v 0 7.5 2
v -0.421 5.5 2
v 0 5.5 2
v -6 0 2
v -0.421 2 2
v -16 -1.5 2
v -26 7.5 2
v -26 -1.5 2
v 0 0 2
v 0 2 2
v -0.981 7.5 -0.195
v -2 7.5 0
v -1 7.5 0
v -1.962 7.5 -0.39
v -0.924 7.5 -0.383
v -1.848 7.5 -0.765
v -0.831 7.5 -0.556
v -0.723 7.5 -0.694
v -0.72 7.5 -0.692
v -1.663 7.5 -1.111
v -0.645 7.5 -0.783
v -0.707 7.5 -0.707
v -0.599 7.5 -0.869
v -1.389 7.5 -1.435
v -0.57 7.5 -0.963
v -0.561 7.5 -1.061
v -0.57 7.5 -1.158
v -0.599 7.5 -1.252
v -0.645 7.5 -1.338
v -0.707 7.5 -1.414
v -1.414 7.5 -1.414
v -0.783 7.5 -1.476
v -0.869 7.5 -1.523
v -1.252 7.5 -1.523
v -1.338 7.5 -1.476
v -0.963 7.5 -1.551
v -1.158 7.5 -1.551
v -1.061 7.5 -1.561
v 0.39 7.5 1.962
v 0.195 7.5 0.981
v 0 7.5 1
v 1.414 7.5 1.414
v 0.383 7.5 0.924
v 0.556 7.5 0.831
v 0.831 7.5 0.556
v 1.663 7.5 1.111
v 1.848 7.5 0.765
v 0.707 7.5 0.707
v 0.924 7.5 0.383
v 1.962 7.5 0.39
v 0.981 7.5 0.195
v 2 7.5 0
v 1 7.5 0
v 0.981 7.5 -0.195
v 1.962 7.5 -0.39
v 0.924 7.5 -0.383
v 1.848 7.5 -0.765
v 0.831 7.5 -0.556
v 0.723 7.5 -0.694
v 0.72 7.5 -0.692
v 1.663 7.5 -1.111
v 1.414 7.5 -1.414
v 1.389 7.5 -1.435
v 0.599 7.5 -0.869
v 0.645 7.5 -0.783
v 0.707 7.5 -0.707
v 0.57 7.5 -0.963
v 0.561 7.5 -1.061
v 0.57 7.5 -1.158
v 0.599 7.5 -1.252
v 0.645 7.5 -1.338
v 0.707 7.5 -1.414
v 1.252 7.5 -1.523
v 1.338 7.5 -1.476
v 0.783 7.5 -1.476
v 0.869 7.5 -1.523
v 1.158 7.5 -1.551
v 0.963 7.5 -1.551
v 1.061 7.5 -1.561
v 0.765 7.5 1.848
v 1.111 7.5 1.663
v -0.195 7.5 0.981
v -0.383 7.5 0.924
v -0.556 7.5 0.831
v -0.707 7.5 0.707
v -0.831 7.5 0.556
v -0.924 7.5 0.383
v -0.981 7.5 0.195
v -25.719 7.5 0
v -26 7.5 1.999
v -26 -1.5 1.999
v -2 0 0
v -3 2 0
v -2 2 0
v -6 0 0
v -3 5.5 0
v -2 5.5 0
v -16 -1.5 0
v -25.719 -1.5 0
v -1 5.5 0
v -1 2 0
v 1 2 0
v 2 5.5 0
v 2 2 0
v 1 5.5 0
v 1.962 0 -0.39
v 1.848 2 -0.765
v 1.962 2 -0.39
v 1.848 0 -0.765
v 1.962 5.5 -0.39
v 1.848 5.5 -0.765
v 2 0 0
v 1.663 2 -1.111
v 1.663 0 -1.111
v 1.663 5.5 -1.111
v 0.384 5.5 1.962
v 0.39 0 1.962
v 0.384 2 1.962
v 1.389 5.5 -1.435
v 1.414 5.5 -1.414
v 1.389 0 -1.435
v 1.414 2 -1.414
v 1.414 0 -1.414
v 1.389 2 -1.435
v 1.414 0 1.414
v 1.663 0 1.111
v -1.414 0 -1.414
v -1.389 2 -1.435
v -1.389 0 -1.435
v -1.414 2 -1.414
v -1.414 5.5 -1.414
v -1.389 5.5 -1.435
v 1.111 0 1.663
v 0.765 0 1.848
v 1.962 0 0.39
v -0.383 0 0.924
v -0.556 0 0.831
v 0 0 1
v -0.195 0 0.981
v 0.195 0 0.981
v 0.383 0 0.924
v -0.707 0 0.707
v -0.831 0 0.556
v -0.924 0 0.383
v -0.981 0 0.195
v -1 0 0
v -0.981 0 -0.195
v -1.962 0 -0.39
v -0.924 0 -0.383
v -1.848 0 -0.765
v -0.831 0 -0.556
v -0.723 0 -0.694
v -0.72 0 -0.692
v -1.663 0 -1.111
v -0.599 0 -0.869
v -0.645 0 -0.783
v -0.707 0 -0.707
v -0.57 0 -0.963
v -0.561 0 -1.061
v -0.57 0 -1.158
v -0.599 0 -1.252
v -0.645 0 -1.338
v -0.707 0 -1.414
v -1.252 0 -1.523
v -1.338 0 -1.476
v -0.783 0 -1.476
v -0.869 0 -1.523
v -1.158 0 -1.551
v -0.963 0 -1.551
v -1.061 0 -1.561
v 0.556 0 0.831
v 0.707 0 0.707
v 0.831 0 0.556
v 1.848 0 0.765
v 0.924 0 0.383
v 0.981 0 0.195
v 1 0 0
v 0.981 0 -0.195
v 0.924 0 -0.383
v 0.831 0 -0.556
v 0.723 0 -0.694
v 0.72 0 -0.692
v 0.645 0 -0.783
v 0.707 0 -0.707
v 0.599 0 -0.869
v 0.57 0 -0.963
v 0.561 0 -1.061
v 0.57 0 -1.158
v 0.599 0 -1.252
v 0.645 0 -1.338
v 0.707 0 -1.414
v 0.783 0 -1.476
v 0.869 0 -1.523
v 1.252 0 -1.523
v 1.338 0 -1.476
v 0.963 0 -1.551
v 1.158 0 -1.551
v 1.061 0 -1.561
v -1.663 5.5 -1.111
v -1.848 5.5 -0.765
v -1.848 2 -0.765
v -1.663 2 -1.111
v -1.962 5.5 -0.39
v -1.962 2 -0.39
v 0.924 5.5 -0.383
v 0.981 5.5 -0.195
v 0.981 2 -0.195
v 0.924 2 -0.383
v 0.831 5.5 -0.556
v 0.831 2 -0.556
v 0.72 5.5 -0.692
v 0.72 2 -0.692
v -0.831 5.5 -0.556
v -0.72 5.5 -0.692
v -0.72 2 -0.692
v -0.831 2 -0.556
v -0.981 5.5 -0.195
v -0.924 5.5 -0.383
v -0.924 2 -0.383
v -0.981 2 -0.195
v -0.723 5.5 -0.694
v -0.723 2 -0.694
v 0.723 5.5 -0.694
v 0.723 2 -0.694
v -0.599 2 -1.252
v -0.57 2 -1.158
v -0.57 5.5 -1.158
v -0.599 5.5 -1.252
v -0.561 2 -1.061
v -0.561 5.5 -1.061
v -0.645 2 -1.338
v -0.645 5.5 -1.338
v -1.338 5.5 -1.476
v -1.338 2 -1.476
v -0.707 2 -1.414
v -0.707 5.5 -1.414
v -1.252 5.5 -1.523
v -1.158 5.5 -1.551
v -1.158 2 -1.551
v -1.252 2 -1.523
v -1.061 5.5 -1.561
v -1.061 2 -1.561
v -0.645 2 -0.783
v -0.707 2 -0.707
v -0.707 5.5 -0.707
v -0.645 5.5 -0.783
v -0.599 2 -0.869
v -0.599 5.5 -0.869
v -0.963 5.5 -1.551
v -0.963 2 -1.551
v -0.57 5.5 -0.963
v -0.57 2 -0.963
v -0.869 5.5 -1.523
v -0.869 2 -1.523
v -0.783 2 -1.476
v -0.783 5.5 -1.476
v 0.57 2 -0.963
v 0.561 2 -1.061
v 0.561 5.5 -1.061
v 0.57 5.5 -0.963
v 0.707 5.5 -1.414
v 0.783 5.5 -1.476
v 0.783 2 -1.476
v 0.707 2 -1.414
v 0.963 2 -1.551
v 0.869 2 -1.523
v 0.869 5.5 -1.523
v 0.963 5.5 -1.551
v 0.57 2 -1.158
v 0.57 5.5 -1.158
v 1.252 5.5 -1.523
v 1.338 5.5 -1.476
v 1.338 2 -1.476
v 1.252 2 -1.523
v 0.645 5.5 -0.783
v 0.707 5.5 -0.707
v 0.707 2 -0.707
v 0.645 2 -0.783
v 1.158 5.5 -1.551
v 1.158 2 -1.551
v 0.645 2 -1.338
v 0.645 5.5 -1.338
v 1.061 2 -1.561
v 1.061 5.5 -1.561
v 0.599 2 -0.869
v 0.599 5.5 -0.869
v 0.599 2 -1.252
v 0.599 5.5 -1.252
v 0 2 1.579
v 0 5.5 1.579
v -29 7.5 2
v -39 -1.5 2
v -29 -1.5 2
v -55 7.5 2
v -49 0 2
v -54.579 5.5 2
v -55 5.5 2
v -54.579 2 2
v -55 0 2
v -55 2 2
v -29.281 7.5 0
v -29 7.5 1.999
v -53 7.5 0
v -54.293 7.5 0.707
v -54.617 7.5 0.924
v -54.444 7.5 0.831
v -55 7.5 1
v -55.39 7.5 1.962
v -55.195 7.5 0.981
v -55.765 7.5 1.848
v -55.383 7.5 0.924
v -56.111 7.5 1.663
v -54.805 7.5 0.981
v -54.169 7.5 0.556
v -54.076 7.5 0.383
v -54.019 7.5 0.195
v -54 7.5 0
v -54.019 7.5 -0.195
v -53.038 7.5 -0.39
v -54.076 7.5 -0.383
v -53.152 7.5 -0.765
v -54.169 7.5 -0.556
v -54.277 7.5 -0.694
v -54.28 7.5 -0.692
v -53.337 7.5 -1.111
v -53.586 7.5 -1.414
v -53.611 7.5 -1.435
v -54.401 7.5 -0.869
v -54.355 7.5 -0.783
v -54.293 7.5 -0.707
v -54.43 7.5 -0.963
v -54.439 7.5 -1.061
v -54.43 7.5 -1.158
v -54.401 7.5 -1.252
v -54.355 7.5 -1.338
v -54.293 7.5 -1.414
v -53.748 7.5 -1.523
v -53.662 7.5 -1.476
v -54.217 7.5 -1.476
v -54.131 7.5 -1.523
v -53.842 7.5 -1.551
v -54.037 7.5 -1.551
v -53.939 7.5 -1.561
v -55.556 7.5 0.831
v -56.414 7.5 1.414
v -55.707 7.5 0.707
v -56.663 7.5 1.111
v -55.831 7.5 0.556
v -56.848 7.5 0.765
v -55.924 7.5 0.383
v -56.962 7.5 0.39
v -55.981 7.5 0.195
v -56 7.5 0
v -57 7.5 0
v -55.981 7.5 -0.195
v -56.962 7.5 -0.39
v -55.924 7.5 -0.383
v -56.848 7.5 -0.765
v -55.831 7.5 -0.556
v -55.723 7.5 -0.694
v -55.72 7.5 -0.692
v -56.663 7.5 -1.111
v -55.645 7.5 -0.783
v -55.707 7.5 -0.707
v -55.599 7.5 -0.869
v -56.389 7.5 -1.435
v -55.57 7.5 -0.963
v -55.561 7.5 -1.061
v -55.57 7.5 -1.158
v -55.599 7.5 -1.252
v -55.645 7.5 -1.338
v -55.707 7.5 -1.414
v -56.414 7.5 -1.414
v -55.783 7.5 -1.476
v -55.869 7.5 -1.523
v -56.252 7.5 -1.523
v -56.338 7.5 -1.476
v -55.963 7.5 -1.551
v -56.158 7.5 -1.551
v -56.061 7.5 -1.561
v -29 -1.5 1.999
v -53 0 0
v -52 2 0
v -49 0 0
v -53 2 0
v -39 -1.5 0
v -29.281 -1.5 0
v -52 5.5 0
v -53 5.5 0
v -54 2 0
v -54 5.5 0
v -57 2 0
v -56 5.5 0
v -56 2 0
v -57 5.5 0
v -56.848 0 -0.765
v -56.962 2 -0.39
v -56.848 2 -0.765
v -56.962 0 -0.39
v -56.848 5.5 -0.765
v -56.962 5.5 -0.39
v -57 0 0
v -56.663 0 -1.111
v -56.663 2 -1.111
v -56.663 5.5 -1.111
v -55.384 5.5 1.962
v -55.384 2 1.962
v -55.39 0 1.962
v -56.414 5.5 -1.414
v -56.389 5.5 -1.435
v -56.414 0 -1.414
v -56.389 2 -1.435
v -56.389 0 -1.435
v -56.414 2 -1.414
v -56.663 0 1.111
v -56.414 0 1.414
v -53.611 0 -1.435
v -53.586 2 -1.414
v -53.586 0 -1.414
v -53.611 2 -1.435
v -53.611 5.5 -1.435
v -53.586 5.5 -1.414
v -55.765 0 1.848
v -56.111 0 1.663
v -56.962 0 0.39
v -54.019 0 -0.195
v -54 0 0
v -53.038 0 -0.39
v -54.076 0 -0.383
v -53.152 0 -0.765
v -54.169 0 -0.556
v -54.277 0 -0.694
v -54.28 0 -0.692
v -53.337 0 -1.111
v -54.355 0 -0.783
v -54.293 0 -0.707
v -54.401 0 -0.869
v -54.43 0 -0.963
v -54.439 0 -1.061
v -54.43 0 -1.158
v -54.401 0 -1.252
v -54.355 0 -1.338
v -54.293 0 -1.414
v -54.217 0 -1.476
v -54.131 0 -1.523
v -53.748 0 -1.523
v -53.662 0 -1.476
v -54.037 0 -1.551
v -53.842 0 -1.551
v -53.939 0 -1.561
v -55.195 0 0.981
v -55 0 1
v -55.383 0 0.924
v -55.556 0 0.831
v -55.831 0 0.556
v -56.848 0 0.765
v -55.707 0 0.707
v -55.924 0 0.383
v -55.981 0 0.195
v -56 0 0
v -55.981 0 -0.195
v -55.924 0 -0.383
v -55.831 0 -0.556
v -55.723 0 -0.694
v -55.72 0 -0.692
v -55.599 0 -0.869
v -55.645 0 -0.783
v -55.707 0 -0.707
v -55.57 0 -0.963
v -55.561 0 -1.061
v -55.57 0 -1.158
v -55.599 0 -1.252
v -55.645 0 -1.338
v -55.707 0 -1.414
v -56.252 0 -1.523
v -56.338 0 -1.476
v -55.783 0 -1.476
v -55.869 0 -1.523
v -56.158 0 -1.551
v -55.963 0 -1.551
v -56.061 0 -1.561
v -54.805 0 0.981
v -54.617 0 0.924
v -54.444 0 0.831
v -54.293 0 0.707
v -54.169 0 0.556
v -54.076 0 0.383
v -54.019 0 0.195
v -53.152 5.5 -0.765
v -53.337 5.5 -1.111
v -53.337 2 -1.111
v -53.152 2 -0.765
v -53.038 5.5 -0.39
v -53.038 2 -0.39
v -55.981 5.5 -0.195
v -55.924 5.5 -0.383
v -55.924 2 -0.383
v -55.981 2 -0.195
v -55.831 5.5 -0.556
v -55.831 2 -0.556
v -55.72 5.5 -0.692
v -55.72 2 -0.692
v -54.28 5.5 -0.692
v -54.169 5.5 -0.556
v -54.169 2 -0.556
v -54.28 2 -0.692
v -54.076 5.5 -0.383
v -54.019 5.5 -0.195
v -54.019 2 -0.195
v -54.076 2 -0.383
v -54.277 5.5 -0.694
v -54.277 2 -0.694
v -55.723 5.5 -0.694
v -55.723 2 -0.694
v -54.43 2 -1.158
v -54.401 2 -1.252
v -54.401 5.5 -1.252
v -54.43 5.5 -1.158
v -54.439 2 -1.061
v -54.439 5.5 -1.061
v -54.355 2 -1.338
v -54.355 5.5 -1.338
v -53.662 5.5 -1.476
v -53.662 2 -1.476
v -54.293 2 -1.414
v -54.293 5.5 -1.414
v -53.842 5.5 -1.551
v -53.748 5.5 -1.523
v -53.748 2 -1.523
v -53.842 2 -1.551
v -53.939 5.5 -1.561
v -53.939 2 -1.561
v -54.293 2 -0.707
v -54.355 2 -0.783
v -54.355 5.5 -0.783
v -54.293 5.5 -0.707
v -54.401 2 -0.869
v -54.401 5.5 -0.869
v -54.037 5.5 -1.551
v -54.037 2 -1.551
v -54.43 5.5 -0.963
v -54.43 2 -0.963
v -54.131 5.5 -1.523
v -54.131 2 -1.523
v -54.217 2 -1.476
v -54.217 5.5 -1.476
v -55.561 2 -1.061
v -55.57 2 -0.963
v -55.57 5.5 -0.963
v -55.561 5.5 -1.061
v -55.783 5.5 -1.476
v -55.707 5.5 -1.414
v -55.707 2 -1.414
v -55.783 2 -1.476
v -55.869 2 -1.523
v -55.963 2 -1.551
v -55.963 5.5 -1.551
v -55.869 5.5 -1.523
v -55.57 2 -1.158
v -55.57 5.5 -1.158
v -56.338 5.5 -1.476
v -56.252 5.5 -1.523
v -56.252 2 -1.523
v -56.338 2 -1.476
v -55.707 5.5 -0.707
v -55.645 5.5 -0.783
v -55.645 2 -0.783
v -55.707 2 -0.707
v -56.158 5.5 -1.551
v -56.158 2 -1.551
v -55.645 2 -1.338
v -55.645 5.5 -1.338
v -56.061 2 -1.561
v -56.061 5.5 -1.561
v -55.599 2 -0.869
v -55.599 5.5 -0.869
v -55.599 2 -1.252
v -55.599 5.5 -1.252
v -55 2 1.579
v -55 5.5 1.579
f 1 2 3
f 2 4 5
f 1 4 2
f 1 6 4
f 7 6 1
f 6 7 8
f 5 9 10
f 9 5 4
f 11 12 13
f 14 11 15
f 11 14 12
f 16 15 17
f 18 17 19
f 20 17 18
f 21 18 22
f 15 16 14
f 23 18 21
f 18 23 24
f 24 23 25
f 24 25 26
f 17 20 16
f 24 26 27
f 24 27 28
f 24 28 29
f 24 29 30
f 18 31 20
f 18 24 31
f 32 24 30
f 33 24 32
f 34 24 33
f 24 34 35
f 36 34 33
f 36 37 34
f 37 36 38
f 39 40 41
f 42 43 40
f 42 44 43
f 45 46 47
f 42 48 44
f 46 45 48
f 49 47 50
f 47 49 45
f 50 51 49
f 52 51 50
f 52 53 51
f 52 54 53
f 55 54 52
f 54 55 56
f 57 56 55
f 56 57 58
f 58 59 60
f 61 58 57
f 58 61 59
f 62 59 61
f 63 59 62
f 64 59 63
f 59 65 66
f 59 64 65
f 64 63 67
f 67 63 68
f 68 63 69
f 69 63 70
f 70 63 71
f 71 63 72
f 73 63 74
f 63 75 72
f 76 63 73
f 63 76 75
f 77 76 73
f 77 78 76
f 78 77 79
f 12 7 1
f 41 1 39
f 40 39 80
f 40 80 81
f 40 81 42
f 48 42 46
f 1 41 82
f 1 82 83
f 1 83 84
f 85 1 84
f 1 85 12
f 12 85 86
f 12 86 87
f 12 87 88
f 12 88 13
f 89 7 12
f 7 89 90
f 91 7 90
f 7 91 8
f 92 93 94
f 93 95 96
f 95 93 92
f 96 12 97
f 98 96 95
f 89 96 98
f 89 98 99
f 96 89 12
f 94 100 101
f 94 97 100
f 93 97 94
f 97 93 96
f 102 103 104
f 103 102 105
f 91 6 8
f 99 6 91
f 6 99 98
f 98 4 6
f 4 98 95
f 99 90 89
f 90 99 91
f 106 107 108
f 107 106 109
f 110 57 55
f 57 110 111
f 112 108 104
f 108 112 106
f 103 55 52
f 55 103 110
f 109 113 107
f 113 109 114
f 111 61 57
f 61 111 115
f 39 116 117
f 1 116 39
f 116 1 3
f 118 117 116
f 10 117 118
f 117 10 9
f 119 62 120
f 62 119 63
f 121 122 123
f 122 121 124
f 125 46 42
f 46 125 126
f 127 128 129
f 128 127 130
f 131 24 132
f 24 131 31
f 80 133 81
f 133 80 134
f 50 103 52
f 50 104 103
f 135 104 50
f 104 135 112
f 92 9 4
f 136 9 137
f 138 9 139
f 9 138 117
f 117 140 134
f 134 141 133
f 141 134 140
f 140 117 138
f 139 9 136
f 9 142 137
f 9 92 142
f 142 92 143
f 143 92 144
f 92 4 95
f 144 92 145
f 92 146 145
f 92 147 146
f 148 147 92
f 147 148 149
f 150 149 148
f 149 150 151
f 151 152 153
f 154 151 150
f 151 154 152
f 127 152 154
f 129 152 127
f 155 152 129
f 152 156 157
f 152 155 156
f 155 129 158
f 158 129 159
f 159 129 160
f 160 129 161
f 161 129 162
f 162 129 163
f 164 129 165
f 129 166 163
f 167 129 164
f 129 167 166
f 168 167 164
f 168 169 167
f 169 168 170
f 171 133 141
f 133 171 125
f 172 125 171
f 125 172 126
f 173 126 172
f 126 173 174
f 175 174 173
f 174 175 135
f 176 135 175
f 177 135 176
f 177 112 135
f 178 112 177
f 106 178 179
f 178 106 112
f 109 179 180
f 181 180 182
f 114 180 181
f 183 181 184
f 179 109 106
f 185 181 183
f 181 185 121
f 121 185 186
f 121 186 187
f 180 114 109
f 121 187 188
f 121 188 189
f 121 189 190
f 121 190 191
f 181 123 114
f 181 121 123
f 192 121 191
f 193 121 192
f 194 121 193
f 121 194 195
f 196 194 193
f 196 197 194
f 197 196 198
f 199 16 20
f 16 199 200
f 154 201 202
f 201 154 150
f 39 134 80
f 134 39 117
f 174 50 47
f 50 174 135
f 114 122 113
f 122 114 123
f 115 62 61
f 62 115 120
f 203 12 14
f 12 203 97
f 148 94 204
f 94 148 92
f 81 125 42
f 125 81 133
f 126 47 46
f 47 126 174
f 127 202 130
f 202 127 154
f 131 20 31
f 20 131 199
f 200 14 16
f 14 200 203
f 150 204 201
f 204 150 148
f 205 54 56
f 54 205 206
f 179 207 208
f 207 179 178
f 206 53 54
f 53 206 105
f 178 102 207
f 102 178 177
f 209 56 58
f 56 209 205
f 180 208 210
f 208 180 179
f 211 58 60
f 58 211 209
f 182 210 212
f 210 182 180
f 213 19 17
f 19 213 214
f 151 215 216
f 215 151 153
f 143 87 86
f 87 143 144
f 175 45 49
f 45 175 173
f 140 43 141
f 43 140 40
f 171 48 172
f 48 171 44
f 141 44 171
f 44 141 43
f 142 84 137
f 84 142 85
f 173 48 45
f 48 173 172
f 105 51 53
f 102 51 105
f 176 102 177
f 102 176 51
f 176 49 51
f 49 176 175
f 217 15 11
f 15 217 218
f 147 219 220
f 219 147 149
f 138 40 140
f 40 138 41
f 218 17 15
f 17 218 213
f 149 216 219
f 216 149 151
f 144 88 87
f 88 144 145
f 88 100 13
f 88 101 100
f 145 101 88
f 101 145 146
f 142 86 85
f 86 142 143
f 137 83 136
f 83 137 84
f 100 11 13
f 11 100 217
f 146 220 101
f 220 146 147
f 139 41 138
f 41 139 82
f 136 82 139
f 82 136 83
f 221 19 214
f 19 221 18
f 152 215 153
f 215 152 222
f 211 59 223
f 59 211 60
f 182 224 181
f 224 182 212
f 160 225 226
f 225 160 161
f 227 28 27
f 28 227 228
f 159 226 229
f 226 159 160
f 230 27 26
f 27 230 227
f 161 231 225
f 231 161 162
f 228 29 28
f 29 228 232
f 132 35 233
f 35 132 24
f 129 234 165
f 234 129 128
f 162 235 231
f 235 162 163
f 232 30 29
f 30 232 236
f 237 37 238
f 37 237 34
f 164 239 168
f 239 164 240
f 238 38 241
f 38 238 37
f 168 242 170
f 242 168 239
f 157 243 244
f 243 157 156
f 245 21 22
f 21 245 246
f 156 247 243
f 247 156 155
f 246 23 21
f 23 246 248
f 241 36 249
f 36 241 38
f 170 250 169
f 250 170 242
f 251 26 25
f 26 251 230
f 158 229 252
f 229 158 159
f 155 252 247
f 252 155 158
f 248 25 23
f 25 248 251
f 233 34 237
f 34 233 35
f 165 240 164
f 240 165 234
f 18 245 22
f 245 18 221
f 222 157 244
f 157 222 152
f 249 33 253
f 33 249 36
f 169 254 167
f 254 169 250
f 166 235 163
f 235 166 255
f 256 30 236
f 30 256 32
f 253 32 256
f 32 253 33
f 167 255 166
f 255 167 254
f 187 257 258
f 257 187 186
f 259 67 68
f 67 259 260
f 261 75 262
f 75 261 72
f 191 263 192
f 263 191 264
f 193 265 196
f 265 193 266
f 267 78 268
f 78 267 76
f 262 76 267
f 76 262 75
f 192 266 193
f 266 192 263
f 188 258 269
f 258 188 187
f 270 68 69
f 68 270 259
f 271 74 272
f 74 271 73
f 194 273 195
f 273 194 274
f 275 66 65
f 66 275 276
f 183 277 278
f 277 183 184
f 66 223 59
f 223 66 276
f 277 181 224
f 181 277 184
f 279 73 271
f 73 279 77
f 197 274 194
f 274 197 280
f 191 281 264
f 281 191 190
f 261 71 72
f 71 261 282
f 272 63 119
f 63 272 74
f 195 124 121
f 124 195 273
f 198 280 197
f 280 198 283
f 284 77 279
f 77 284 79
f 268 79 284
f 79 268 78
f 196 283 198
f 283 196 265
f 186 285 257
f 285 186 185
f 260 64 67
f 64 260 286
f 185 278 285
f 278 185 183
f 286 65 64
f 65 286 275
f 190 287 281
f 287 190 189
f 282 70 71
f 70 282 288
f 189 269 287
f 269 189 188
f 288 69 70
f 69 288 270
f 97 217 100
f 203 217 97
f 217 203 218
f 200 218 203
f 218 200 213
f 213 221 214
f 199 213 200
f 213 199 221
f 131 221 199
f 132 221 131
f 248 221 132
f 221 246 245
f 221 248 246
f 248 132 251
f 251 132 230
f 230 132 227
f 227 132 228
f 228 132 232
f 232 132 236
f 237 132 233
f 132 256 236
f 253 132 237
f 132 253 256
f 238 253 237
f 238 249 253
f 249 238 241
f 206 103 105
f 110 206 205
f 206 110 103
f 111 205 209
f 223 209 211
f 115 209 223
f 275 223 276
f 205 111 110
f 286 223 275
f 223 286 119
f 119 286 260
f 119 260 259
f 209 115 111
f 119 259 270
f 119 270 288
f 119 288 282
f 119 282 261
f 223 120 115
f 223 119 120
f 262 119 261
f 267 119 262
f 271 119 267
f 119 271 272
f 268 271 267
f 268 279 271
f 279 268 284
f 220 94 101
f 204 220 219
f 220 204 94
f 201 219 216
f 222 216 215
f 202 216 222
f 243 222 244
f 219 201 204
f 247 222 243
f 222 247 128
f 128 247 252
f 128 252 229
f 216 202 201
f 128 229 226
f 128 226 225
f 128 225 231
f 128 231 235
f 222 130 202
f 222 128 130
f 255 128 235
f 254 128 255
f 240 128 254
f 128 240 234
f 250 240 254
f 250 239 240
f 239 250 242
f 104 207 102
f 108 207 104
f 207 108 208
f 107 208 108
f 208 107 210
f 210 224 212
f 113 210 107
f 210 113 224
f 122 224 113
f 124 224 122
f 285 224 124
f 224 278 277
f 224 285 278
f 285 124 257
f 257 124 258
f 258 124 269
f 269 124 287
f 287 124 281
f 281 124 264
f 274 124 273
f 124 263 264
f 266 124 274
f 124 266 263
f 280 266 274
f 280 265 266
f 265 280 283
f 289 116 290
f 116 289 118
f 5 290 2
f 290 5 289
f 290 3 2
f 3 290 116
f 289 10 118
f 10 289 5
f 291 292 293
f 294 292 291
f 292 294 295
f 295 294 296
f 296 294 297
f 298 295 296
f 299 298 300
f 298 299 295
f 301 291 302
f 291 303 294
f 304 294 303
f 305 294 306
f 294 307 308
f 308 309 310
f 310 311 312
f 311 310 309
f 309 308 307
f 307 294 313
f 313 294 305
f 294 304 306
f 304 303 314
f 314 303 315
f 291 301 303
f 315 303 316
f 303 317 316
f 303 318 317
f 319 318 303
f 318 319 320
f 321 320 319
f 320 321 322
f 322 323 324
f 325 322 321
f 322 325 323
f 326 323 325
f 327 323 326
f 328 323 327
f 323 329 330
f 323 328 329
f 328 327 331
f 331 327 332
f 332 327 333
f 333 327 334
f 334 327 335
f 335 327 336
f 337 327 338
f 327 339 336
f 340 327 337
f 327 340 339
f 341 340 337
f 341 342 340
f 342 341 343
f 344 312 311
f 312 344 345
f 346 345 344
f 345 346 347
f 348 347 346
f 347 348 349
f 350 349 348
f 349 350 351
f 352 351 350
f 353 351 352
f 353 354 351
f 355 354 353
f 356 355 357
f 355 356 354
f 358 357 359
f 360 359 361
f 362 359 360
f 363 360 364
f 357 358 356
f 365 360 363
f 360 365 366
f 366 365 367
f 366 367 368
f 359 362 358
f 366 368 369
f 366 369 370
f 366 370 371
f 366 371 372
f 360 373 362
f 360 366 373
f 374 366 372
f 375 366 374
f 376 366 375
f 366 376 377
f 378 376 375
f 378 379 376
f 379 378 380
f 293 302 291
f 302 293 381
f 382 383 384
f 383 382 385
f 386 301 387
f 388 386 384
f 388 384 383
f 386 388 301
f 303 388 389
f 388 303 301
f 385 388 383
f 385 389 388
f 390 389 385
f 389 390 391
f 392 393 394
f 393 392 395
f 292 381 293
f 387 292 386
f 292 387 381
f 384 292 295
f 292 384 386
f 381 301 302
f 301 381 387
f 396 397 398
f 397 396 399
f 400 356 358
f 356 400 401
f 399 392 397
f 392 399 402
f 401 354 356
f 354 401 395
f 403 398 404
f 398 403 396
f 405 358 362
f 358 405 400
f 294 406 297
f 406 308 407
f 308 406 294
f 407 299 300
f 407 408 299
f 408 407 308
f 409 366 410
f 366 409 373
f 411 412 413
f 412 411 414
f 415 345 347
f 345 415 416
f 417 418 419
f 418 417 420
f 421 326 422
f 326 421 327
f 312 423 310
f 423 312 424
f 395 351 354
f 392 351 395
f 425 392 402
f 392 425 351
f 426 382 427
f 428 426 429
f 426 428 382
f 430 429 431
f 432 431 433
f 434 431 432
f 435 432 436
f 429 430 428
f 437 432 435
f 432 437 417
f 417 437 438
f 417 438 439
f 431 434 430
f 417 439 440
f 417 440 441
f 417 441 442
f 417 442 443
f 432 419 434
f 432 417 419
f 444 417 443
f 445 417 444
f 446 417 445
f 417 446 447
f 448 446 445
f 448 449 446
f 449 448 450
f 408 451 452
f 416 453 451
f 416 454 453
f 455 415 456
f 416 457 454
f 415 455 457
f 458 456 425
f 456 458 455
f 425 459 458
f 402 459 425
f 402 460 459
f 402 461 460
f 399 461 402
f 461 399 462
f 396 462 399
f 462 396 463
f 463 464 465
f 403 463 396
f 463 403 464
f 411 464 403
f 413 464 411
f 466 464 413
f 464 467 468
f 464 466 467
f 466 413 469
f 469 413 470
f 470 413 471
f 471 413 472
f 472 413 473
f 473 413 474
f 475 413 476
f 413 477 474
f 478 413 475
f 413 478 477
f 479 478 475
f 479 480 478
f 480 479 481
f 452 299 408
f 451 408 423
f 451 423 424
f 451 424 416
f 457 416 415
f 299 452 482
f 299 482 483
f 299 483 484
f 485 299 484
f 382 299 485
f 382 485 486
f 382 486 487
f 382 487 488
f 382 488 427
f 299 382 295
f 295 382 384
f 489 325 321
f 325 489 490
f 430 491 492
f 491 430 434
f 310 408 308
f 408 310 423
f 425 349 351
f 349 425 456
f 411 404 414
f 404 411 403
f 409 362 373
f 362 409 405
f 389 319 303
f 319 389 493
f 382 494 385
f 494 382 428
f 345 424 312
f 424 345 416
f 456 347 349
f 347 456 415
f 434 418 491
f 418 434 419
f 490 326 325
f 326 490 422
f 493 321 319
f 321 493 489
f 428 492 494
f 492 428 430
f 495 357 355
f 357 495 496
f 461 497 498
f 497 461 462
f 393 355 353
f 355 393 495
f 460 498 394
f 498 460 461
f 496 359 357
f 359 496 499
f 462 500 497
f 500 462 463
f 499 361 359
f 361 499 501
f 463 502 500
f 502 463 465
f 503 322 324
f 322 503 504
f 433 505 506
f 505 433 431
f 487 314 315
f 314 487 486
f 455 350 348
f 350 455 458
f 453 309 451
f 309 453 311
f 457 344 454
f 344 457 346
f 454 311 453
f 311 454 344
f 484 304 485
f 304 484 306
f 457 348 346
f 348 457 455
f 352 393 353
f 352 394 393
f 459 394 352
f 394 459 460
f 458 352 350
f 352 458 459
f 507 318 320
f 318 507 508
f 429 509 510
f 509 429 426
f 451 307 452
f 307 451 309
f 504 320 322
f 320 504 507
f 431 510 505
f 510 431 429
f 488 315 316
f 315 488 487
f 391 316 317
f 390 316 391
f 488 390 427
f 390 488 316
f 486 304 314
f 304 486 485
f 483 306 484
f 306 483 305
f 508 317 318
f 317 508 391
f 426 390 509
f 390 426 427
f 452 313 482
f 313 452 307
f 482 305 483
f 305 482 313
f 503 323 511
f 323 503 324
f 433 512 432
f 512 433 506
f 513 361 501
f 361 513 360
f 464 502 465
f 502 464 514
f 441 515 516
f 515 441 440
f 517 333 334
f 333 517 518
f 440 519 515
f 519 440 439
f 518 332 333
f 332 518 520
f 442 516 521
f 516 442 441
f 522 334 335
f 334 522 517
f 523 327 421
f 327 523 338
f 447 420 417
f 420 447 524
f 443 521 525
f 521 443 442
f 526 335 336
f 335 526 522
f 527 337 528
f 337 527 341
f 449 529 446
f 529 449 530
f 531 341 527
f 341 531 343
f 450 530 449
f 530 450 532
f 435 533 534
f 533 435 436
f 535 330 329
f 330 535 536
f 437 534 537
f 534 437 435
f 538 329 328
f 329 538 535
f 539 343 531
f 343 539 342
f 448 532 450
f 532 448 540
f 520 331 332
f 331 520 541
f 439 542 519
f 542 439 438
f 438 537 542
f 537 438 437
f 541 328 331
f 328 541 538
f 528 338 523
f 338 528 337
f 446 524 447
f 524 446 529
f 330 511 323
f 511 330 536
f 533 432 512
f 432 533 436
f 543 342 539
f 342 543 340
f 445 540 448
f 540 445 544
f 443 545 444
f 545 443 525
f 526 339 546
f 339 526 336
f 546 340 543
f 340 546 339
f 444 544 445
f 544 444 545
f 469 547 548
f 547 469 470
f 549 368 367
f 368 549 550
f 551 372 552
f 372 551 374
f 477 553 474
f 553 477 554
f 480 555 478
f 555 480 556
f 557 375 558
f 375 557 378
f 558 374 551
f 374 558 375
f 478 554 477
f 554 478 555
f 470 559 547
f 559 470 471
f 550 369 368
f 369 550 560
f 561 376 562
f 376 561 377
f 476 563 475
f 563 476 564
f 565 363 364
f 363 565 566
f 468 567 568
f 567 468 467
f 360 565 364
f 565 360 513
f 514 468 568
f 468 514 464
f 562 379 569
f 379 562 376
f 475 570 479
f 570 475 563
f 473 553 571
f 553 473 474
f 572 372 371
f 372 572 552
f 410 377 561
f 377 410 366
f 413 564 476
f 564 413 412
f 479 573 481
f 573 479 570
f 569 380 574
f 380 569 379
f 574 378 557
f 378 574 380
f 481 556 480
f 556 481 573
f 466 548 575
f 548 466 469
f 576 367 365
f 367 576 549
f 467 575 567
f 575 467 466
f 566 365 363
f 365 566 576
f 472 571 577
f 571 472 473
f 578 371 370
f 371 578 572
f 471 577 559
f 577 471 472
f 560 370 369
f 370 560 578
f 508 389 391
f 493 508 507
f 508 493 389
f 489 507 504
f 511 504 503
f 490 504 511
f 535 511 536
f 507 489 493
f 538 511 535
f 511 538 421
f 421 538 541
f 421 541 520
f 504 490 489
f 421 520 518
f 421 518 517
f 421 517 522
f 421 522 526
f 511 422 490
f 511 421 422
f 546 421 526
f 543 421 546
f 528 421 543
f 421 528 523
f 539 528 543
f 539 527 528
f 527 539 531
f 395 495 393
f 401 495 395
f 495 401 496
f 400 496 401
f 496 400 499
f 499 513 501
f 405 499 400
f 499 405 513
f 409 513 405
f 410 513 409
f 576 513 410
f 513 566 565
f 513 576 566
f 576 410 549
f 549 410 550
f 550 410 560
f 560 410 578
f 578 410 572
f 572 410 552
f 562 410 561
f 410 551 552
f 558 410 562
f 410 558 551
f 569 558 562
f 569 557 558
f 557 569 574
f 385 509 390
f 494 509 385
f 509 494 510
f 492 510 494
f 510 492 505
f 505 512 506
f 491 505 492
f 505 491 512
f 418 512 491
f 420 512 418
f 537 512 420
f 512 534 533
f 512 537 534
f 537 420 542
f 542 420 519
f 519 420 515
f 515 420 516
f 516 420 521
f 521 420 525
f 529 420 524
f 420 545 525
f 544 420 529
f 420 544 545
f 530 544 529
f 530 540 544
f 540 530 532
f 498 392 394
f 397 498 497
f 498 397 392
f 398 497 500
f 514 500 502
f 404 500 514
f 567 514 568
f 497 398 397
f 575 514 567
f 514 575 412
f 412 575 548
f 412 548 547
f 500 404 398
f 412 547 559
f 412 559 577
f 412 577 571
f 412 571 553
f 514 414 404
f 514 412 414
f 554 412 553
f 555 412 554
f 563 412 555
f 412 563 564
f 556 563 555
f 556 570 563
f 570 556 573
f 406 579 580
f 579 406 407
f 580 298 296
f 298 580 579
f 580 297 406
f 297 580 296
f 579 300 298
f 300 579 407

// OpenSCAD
/**
 * Martin Egli
 * 2022-10-11
 */
module k750foot_v1_0(loc_res = 32) {
    difference() {
        union() {
            difference() {
                union() {
                    translate([0, 0, 0])
                    rotate([-90, 0, 0])
                    cylinder(d = 4, h = 7.5, $fn = loc_res);
                    difference() {
                        hull() {
                            translate([-(28-2), -1.5, 0])
                            cube([28-2-16, 9, 2]);
                            translate([-(12), 0, 0])
                            cube([6, 7.5, 2]);
                        }
                        translate([-28-2.18, -2, 3])
                        rotate([0, 90-8, 0])
                        cube([6, 11, 4]);
                    }
                    translate([-(6), 0, 0])
                    cube([6, 7.5, 2]);
                }

                translate([0, -1, 0])
                rotate([-90, 0, 0])
                cylinder(d = 2, h = 9.5, $fn = loc_res);

                translate([0, -1, -2])
                rotate([-90, 0, 0])
                cylinder(d = 3, h = 9.5, $fn = loc_res);
            }
            translate([1.5*cos((90+45)), 0, -1.5*sin((90+45))])
            rotate([-90, 0, 0])
            cylinder(d = 1, h = 7.5, $fn = loc_res);
            translate([1.5*cos((90-45)), 0, -1.5*sin((90-45))])
            rotate([-90, 0, 0])
            cylinder(d = 1, h = 7.5, $fn = loc_res);
            }
    
        translate([-3, 2, -3])
        cube([6, 3.5, 3]);
        
        #translate([-3*sqrt(2)/2, 2, 3.7])
        rotate([0, 45, 0])
        cube([3, 3.5, 3]);
    }
}

k750foot_v1_0();

translate([-55, 0, 0])
mirror([1, 0, 0])
k750foot_v1_0();
